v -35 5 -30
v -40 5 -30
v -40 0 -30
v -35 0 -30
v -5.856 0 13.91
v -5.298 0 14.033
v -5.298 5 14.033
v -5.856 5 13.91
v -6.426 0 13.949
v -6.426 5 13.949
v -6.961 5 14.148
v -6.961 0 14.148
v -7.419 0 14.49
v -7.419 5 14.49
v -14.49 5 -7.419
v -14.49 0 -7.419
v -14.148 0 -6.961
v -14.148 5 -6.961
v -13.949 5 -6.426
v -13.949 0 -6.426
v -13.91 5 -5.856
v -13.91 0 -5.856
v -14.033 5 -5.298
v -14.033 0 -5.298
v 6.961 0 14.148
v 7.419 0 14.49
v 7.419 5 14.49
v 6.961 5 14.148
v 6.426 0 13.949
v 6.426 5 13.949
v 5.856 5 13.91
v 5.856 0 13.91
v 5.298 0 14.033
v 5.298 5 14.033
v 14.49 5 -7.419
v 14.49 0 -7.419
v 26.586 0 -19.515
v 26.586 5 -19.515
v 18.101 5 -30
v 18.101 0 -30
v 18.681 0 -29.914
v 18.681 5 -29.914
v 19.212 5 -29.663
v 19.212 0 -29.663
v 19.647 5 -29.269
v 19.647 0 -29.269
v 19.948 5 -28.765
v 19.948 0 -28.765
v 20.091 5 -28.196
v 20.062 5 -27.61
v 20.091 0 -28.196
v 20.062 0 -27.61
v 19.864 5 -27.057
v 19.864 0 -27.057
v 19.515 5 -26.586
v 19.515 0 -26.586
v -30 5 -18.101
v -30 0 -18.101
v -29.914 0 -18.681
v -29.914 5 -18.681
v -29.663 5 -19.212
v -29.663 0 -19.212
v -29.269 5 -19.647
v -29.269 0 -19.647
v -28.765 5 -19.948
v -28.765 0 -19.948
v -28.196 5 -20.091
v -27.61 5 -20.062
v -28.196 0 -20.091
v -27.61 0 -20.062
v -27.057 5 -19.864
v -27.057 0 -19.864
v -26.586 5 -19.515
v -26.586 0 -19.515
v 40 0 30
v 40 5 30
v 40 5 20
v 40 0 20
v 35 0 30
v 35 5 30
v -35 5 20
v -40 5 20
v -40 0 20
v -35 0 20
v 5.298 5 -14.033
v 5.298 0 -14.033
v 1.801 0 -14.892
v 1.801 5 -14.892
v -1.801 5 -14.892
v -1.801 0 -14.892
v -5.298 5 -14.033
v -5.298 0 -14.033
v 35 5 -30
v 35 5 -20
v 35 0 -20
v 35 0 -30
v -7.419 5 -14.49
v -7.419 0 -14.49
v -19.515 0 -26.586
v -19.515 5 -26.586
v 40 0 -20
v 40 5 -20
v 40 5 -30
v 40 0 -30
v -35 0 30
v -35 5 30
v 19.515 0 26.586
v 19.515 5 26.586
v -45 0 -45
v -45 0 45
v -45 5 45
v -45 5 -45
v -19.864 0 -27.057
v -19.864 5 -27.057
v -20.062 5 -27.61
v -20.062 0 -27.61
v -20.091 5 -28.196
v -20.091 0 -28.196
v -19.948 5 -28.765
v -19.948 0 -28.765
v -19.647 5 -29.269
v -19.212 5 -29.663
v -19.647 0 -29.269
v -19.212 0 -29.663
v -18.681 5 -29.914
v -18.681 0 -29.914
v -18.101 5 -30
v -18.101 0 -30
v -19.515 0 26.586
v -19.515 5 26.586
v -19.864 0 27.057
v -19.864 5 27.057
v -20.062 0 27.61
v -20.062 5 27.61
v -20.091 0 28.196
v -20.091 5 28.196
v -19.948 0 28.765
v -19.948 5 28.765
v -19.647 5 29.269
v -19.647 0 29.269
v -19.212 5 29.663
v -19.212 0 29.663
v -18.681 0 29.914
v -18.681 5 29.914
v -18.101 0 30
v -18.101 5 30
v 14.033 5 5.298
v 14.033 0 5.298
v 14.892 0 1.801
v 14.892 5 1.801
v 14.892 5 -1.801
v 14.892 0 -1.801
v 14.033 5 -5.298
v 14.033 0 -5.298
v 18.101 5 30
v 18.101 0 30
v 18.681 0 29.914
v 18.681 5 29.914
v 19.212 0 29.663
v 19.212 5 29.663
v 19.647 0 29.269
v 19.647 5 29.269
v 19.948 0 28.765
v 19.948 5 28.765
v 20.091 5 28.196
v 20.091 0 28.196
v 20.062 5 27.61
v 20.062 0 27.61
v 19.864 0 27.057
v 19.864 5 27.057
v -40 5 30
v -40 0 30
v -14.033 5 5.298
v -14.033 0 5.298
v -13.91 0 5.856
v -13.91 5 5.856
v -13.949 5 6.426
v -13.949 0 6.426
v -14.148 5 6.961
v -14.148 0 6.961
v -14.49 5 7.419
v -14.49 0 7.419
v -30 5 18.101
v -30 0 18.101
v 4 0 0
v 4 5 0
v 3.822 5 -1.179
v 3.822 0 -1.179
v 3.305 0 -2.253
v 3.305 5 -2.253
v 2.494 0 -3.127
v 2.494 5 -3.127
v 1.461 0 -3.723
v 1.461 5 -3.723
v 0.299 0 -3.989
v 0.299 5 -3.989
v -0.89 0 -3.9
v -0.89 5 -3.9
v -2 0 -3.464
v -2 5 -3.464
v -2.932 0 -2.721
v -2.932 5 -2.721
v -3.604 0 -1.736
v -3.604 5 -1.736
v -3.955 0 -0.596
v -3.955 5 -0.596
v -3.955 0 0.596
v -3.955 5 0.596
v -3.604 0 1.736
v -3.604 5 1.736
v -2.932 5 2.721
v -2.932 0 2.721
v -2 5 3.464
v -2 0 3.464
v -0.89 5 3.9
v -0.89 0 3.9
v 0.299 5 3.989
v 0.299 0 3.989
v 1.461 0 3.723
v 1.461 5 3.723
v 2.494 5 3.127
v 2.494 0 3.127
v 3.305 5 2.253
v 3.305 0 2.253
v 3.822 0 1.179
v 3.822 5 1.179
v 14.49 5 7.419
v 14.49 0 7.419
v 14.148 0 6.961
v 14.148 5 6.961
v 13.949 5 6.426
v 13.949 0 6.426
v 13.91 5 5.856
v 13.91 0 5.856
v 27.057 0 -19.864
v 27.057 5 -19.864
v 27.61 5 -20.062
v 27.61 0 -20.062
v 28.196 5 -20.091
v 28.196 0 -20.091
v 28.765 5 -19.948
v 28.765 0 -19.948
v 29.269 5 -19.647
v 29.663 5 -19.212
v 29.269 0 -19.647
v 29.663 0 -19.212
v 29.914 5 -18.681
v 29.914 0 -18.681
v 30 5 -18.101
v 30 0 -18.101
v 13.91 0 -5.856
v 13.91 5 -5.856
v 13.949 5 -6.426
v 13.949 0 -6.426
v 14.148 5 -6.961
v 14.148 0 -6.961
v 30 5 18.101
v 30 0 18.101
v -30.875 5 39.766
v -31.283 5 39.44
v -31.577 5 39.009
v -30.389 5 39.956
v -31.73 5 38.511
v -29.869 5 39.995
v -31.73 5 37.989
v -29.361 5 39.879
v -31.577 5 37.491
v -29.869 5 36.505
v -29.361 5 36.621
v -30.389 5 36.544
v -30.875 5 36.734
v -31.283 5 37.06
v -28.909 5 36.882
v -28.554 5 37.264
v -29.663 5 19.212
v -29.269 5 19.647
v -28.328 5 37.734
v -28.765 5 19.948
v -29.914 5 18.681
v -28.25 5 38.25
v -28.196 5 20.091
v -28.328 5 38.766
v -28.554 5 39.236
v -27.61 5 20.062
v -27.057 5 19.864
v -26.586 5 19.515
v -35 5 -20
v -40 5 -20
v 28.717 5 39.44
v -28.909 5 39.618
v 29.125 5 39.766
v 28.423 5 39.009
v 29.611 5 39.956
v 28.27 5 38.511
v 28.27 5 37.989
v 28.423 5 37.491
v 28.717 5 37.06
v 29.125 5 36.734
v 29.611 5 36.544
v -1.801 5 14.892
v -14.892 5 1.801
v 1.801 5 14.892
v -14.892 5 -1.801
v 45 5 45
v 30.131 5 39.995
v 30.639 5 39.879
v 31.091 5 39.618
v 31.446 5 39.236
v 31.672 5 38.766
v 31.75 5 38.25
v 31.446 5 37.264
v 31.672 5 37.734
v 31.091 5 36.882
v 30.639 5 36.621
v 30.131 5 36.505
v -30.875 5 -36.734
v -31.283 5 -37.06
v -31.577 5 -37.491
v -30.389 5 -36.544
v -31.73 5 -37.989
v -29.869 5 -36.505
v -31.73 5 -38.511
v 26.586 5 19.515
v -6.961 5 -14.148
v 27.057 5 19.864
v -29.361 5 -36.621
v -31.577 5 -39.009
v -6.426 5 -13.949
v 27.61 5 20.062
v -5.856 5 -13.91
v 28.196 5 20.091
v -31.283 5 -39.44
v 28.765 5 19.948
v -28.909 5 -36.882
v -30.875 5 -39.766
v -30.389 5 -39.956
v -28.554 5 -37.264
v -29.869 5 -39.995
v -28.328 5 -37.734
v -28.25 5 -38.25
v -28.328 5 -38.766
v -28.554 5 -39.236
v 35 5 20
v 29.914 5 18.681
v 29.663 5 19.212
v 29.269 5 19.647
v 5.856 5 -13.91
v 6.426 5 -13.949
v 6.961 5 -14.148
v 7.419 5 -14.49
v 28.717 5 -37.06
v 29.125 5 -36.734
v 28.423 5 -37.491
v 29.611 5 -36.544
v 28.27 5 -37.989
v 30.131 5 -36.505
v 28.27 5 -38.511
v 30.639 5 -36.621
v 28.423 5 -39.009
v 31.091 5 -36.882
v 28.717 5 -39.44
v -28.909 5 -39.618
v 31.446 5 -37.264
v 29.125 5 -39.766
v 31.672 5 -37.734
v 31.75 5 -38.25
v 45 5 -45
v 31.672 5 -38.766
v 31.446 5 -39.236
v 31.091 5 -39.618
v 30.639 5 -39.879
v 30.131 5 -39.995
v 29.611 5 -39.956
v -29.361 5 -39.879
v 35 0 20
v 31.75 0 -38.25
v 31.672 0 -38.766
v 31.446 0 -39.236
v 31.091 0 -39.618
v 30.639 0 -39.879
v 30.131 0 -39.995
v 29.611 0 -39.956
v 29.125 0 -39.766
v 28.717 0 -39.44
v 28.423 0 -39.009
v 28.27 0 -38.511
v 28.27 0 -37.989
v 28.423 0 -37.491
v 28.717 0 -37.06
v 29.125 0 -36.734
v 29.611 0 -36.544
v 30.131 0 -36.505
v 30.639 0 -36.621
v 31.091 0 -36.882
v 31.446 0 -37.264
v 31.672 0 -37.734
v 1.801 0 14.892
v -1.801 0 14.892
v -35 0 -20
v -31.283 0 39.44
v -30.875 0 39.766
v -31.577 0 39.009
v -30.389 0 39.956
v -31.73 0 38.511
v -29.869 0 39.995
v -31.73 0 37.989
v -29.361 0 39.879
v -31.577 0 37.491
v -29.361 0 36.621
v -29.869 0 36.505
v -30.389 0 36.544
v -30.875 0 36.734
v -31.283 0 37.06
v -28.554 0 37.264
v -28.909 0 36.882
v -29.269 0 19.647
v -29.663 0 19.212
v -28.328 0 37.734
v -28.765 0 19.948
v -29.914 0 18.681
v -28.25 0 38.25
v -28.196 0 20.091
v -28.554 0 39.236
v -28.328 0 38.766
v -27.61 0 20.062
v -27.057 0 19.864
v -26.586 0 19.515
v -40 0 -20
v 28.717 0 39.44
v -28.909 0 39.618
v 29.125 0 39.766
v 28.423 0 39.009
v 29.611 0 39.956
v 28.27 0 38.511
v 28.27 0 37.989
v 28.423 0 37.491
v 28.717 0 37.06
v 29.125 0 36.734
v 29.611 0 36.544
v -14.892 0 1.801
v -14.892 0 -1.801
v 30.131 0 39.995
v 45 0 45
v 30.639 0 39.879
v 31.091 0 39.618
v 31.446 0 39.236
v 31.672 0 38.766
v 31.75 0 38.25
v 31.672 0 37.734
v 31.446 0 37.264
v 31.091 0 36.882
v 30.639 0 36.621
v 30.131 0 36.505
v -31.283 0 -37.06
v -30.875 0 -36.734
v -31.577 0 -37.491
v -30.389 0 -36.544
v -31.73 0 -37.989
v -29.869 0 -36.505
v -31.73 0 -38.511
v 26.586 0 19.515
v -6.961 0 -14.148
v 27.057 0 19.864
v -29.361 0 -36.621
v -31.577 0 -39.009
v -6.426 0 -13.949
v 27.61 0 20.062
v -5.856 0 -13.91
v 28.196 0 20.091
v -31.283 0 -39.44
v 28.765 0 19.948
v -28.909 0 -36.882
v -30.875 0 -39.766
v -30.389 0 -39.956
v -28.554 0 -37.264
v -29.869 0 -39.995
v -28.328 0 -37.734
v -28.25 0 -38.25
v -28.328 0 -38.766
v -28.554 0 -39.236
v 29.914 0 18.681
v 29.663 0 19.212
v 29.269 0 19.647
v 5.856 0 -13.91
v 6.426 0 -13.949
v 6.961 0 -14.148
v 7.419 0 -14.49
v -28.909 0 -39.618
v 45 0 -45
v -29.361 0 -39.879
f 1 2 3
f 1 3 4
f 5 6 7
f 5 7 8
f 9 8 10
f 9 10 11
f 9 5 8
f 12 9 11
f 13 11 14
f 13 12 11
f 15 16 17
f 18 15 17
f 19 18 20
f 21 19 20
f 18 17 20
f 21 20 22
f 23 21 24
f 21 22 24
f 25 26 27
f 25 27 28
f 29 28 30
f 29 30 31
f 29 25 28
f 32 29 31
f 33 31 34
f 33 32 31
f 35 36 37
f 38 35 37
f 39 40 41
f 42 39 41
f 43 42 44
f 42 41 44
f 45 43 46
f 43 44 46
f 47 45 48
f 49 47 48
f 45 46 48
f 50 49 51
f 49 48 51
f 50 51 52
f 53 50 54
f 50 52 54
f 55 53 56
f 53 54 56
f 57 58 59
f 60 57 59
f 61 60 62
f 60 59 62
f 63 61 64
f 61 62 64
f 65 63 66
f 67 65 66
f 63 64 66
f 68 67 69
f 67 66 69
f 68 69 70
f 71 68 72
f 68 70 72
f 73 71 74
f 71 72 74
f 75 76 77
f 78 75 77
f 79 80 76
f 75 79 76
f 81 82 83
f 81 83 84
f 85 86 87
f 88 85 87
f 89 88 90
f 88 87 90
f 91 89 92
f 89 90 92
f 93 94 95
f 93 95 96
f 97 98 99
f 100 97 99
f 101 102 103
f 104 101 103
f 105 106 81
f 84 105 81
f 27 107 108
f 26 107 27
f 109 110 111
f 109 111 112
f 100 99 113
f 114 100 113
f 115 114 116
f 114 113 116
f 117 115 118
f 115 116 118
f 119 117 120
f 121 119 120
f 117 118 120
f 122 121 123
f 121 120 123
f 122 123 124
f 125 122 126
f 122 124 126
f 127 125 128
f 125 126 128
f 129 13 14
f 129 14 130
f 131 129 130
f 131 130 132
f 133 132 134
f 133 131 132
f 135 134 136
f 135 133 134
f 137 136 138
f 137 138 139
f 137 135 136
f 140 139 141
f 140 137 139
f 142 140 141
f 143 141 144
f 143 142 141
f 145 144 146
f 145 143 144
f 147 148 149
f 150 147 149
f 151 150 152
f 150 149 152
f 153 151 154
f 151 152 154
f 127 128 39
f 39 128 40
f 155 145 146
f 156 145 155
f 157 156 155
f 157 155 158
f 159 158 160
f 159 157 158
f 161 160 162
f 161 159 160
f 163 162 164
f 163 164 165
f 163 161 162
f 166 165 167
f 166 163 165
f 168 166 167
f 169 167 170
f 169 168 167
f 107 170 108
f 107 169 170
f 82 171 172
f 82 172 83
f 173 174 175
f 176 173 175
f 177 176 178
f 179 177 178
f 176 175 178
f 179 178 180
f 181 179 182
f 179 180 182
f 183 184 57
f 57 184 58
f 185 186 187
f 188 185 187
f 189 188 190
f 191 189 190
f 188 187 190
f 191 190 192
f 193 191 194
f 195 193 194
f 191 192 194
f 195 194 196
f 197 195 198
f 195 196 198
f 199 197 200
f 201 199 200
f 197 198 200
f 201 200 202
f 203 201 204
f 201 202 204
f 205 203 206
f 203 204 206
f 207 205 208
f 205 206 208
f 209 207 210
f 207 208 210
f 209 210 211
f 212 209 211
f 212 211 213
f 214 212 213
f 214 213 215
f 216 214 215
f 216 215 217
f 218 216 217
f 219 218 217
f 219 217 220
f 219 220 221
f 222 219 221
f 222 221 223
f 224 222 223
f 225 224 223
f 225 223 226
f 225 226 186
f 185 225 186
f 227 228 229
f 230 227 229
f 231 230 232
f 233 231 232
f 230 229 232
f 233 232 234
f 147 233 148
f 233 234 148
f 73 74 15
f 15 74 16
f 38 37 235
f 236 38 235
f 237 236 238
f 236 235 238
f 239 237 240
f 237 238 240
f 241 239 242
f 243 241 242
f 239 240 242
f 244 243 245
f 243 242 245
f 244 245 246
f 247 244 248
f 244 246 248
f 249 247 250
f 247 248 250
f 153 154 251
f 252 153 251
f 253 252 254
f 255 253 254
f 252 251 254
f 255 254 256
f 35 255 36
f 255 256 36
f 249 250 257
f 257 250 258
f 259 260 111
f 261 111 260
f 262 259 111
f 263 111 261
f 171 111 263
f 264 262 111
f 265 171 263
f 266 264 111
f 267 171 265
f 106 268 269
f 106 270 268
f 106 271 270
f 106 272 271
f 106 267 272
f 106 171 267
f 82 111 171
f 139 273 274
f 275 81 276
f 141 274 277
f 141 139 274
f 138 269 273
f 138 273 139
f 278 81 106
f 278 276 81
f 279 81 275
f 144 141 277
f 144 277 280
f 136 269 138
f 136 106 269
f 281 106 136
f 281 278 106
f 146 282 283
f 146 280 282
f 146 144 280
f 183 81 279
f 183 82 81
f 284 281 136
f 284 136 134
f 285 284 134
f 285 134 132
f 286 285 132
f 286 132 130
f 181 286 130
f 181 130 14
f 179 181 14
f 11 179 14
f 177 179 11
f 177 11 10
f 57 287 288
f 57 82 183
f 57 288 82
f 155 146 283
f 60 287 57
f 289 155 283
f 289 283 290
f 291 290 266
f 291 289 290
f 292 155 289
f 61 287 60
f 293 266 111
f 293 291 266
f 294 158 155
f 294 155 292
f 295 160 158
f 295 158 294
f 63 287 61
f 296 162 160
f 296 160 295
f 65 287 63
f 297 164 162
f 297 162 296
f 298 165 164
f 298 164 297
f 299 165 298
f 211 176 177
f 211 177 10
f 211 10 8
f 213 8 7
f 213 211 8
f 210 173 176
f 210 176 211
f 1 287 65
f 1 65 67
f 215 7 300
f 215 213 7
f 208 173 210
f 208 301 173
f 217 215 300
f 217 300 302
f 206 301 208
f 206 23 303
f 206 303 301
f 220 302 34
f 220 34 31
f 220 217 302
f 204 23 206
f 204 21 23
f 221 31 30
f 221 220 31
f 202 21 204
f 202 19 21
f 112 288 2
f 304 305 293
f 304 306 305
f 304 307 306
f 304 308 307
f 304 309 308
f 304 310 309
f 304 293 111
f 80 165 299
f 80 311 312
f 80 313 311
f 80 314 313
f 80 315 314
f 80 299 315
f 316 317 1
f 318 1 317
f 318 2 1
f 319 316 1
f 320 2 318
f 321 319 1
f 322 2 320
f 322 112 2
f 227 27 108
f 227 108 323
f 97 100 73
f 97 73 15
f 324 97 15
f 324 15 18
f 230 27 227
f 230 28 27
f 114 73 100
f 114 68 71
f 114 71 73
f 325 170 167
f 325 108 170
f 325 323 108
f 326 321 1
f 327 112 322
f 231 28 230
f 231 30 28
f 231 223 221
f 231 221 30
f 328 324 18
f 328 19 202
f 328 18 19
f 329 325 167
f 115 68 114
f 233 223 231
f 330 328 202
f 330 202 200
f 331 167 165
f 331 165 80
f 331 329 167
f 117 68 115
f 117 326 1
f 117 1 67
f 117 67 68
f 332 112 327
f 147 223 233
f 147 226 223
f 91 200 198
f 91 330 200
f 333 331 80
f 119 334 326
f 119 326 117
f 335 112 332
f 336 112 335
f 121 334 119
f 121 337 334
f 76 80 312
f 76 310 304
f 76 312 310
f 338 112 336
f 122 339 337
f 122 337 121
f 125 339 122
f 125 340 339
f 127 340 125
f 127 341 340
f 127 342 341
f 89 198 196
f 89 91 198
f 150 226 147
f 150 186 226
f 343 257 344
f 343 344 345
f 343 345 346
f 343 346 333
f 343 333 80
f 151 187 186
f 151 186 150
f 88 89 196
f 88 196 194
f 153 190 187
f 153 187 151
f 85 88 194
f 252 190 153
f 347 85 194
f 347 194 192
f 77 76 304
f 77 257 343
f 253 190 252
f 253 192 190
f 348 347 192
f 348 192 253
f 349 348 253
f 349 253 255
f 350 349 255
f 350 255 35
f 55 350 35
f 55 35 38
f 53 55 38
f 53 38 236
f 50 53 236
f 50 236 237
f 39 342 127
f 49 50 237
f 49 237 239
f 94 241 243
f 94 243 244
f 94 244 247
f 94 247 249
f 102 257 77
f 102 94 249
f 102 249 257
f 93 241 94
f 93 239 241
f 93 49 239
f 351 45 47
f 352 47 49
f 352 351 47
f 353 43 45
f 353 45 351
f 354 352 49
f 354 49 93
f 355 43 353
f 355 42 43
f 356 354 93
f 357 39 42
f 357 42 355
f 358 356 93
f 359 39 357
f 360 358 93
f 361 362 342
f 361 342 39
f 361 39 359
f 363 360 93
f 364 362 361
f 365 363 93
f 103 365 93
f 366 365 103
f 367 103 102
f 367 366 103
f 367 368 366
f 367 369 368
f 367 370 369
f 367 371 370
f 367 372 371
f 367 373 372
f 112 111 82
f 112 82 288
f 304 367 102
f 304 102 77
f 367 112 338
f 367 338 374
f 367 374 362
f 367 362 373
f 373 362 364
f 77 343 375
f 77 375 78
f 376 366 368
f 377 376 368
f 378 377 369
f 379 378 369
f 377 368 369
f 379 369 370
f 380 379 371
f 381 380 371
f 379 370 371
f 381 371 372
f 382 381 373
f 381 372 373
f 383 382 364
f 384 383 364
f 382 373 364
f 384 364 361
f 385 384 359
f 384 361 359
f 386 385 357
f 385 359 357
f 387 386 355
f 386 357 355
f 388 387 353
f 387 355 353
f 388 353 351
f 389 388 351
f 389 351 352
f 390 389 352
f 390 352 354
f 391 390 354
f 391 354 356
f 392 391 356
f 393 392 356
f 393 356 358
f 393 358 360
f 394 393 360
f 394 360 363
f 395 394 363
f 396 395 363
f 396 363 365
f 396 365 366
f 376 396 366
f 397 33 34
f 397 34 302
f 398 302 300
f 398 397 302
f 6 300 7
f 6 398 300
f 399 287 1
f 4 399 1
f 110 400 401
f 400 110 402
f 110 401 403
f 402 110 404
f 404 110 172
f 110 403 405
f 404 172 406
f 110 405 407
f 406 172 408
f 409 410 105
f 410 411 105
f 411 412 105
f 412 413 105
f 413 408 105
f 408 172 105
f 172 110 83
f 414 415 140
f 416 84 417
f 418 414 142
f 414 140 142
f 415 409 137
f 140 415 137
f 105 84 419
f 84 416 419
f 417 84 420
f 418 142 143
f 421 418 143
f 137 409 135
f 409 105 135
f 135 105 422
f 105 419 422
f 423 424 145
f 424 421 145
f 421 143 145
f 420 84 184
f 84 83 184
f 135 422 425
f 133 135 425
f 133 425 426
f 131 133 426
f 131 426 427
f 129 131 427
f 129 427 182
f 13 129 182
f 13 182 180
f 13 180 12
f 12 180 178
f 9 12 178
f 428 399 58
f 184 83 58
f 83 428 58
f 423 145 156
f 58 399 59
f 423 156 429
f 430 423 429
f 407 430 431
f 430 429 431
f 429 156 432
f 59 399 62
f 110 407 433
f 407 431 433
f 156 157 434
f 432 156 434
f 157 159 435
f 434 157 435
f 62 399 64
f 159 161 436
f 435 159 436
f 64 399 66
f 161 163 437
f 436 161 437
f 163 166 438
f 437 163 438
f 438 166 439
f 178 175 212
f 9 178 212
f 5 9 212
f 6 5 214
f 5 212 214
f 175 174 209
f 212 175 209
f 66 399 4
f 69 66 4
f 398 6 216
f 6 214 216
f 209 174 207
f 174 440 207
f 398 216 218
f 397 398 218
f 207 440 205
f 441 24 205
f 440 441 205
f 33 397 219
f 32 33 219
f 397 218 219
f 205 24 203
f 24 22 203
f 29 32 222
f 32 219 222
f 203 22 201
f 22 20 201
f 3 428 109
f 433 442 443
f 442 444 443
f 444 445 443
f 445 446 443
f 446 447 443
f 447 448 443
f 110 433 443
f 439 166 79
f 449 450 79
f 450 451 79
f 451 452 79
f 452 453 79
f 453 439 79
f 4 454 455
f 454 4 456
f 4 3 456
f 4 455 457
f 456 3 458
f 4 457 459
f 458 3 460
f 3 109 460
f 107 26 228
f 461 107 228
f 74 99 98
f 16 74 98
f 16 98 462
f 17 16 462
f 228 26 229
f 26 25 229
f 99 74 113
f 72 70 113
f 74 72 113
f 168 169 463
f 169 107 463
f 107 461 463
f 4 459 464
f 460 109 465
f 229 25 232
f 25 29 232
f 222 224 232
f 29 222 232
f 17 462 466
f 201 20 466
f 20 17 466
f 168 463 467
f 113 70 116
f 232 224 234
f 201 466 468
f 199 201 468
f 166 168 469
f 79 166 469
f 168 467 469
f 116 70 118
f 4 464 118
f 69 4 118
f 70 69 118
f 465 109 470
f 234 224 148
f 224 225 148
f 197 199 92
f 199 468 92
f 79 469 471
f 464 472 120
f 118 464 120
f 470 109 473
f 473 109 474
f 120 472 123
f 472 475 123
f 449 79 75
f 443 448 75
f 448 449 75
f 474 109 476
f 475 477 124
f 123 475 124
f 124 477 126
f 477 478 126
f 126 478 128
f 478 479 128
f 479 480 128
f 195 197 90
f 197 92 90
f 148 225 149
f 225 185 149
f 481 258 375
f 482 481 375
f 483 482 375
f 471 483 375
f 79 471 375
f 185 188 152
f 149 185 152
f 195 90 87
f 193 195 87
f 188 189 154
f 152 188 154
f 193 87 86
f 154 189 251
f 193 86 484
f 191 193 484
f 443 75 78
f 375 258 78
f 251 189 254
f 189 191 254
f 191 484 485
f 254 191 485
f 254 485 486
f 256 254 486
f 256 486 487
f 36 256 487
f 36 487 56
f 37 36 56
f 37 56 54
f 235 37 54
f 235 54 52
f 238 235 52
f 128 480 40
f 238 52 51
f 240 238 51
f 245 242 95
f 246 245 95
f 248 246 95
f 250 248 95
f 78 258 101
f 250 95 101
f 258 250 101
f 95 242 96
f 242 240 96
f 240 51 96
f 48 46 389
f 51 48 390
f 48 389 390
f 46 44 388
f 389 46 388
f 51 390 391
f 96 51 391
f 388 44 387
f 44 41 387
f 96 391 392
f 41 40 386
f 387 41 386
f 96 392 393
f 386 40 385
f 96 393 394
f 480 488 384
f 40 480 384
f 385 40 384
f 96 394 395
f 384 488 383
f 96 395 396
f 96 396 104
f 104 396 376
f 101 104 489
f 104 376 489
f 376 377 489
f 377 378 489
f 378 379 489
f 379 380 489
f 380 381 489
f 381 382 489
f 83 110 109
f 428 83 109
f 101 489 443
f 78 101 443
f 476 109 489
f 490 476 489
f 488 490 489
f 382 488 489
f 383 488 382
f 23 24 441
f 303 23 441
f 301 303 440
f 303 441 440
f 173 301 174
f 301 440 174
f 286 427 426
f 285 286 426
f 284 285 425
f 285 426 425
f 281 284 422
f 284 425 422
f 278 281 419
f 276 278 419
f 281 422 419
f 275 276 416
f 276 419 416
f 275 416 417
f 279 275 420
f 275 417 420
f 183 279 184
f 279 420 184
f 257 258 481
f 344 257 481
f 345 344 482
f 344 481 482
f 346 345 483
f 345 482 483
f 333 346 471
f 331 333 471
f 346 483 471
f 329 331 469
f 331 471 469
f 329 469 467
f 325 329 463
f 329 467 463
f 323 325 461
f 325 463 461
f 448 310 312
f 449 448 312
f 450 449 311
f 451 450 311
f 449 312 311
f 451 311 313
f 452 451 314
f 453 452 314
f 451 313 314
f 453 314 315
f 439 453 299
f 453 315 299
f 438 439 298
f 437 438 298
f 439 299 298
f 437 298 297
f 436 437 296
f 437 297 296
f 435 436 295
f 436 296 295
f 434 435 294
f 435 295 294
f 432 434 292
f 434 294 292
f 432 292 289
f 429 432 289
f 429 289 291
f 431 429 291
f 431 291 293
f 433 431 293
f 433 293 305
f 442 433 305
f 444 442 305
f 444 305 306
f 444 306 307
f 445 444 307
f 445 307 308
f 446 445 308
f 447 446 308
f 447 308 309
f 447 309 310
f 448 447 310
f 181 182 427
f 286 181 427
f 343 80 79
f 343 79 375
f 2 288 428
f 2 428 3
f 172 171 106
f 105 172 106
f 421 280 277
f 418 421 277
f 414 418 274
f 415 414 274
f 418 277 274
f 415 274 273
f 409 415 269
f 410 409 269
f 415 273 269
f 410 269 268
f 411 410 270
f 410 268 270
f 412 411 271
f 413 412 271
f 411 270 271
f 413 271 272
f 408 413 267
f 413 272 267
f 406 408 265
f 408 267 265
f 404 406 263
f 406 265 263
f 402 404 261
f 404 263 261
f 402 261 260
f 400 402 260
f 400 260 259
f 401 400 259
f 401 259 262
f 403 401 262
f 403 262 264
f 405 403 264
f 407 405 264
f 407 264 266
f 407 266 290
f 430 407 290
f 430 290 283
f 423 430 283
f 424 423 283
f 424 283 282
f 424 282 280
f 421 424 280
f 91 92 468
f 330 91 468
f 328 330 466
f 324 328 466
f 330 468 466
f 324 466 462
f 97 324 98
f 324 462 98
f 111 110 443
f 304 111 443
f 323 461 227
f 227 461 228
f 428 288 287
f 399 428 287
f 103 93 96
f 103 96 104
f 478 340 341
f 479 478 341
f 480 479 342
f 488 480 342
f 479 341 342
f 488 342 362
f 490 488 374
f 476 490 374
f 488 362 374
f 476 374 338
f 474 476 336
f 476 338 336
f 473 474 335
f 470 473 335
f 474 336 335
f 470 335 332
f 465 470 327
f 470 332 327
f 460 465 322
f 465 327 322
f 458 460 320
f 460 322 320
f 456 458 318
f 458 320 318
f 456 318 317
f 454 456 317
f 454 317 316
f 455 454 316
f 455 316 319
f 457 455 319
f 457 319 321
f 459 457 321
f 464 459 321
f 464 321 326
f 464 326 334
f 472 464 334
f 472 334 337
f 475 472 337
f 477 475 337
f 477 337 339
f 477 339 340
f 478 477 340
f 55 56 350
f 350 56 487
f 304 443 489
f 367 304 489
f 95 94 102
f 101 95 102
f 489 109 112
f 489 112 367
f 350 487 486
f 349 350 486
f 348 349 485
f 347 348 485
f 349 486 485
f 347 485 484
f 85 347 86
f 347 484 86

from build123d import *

# Parameters (mm, degrees)
SKETCH1_W               = 90
SKETCH1_H               = 90
SKETCH1_R               = 3.501345848
BOSS_EXTRUDE1_DEPTH     = 5
SKETCH2_R               = 1.75
SKETCH2_W               = 5
SKETCH2_H               = 10
CUT_EXTRUDE1_DEPTH      = 1
CUT_EXTRUDE1_DEPTH_BACK = 6
SKETCH3_R               = 4
CUT_EXTRUDE2_DEPTH      = 10


with BuildPart() as part:
    # Sketch1 → Boss-Extrude1 (new body)
    with BuildSketch(Plane(origin=(0, 0, 0), x_dir=(1, 0, 0), z_dir=(0, 1, 0))):
        Rectangle(SKETCH1_W, SKETCH1_H)
        Circle(SKETCH1_R, mode=Mode.SUBTRACT)
        with BuildLine():
            Line((-26.585786438, 19.514718626), (-14.489985056, 7.418917244))
            ThreePointArc((-14.489985056, 7.418917244), (-13.949056578, 6.425915745), (-14.033116428, 5.298267955))
            ThreePointArc((-14.033116428, 5.298267955), (-15, 0), (-14.033116428, -5.298267955))
            ThreePointArc((-14.033116428, -5.298267955), (-13.949056578, -6.425915745), (-14.489985056, -7.418917244))
            Line((-14.489985056, -7.418917244), (-26.585786438, -19.514718626))
            ThreePointArc((-26.585786438, -19.514718626), (-28.765366865, -19.948264128), (-30, -18.100505063))
            Line((-30, -18.100505063), (-30, 18.100505063))
            ThreePointArc((-30, 18.100505063), (-28.765366865, 19.948264128), (-26.585786438, 19.514718626))
        make_face(mode=Mode.SUBTRACT)
        with BuildLine():
            Line((-18.100505063, 30), (18.100505063, 30))
            ThreePointArc((18.100505063, 30), (19.948264128, 28.765366865), (19.514718626, 26.585786438))
            Line((19.514718626, 26.585786438), (7.418917244, 14.489985056))
            ThreePointArc((7.418917244, 14.489985056), (6.425915745, 13.949056578), (5.298267955, 14.033116428))
            ThreePointArc((5.298267955, 14.033116428), (0, 15), (-5.298267955, 14.033116428))
            ThreePointArc((-5.298267955, 14.033116428), (-6.425915745, 13.949056578), (-7.418917244, 14.489985056))
            Line((-7.418917244, 14.489985056), (-19.514718626, 26.585786438))
            ThreePointArc((-19.514718626, 26.585786438), (-19.948264128, 28.765366865), (-18.100505063, 30))
        make_face(mode=Mode.SUBTRACT)
        with BuildLine():
            Line((30, 18.100505063), (30, -18.100505063))
            ThreePointArc((30, -18.100505063), (28.765366865, -19.948264128), (26.585786438, -19.514718626))
            Line((26.585786438, -19.514718626), (14.489985056, -7.418917244))
            ThreePointArc((14.489985056, -7.418917244), (13.949056578, -6.425915745), (14.033116428, -5.298267955))
            ThreePointArc((14.033116428, -5.298267955), (15, 0), (14.033116428, 5.298267955))
            ThreePointArc((14.033116428, 5.298267955), (13.949056578, 6.425915745), (14.489985056, 7.418917244))
            Line((14.489985056, 7.418917244), (26.585786438, 19.514718626))
            ThreePointArc((26.585786438, 19.514718626), (28.765366865, 19.948264128), (30, 18.100505063))
        make_face(mode=Mode.SUBTRACT)
        with BuildLine():
            Line((19.514718626, -26.585786438), (7.418917244, -14.489985056))
            ThreePointArc((7.418917244, -14.489985056), (6.425915745, -13.949056578), (5.298267955, -14.033116428))
            ThreePointArc((5.298267955, -14.033116428), (0, -15), (-5.298267955, -14.033116428))
            ThreePointArc((-5.298267955, -14.033116428), (-6.425915745, -13.949056578), (-7.418917244, -14.489985056))
            Line((-7.418917244, -14.489985056), (-19.514718626, -26.585786438))
            ThreePointArc((-19.514718626, -26.585786438), (-19.948264128, -28.765366865), (-18.100505063, -30))
            Line((-18.100505063, -30), (18.100505063, -30))
            ThreePointArc((18.100505063, -30), (19.948264128, -28.765366865), (19.514718626, -26.585786438))
        make_face(mode=Mode.SUBTRACT)
    extrude(amount=BOSS_EXTRUDE1_DEPTH)

    # Sketch2 → Cut-Extrude1 (cut, two sides)
    with BuildSketch(Plane(origin=(0, 5, 0), x_dir=(1, 0, 0), z_dir=(0, 1, 0))) as cut_extrude1_sk:
        with Locations((-30, -38.25)):
            Circle(SKETCH2_R)
        with Locations((30, -38.25)):
            Circle(SKETCH2_R)
        with Locations((30, 38.25)):
            Circle(SKETCH2_R)
        with Locations((-30, 38.25)):
            Circle(SKETCH2_R)
        with Locations((37.5, 25)):
            Rectangle(SKETCH2_W, SKETCH2_H)
        with Locations((37.5, -25)):
            Rectangle(SKETCH2_W, SKETCH2_H)
        with Locations((-37.5, -25)):
            Rectangle(SKETCH2_W, SKETCH2_H)
        with Locations((-37.5, 25)):
            Rectangle(SKETCH2_W, SKETCH2_H)
    extrude(amount=CUT_EXTRUDE1_DEPTH, mode=Mode.SUBTRACT)
    extrude(cut_extrude1_sk.sketch, amount=-CUT_EXTRUDE1_DEPTH_BACK, mode=Mode.SUBTRACT)

    # Sketch3 → Cut-Extrude2 (cut)
    with BuildSketch(Plane(origin=(0, 5, 0), x_dir=(1, 0, 0), z_dir=(0, 1, 0))):
        Circle(SKETCH3_R)
    extrude(amount=-CUT_EXTRUDE2_DEPTH, mode=Mode.SUBTRACT)


solid = part.part
